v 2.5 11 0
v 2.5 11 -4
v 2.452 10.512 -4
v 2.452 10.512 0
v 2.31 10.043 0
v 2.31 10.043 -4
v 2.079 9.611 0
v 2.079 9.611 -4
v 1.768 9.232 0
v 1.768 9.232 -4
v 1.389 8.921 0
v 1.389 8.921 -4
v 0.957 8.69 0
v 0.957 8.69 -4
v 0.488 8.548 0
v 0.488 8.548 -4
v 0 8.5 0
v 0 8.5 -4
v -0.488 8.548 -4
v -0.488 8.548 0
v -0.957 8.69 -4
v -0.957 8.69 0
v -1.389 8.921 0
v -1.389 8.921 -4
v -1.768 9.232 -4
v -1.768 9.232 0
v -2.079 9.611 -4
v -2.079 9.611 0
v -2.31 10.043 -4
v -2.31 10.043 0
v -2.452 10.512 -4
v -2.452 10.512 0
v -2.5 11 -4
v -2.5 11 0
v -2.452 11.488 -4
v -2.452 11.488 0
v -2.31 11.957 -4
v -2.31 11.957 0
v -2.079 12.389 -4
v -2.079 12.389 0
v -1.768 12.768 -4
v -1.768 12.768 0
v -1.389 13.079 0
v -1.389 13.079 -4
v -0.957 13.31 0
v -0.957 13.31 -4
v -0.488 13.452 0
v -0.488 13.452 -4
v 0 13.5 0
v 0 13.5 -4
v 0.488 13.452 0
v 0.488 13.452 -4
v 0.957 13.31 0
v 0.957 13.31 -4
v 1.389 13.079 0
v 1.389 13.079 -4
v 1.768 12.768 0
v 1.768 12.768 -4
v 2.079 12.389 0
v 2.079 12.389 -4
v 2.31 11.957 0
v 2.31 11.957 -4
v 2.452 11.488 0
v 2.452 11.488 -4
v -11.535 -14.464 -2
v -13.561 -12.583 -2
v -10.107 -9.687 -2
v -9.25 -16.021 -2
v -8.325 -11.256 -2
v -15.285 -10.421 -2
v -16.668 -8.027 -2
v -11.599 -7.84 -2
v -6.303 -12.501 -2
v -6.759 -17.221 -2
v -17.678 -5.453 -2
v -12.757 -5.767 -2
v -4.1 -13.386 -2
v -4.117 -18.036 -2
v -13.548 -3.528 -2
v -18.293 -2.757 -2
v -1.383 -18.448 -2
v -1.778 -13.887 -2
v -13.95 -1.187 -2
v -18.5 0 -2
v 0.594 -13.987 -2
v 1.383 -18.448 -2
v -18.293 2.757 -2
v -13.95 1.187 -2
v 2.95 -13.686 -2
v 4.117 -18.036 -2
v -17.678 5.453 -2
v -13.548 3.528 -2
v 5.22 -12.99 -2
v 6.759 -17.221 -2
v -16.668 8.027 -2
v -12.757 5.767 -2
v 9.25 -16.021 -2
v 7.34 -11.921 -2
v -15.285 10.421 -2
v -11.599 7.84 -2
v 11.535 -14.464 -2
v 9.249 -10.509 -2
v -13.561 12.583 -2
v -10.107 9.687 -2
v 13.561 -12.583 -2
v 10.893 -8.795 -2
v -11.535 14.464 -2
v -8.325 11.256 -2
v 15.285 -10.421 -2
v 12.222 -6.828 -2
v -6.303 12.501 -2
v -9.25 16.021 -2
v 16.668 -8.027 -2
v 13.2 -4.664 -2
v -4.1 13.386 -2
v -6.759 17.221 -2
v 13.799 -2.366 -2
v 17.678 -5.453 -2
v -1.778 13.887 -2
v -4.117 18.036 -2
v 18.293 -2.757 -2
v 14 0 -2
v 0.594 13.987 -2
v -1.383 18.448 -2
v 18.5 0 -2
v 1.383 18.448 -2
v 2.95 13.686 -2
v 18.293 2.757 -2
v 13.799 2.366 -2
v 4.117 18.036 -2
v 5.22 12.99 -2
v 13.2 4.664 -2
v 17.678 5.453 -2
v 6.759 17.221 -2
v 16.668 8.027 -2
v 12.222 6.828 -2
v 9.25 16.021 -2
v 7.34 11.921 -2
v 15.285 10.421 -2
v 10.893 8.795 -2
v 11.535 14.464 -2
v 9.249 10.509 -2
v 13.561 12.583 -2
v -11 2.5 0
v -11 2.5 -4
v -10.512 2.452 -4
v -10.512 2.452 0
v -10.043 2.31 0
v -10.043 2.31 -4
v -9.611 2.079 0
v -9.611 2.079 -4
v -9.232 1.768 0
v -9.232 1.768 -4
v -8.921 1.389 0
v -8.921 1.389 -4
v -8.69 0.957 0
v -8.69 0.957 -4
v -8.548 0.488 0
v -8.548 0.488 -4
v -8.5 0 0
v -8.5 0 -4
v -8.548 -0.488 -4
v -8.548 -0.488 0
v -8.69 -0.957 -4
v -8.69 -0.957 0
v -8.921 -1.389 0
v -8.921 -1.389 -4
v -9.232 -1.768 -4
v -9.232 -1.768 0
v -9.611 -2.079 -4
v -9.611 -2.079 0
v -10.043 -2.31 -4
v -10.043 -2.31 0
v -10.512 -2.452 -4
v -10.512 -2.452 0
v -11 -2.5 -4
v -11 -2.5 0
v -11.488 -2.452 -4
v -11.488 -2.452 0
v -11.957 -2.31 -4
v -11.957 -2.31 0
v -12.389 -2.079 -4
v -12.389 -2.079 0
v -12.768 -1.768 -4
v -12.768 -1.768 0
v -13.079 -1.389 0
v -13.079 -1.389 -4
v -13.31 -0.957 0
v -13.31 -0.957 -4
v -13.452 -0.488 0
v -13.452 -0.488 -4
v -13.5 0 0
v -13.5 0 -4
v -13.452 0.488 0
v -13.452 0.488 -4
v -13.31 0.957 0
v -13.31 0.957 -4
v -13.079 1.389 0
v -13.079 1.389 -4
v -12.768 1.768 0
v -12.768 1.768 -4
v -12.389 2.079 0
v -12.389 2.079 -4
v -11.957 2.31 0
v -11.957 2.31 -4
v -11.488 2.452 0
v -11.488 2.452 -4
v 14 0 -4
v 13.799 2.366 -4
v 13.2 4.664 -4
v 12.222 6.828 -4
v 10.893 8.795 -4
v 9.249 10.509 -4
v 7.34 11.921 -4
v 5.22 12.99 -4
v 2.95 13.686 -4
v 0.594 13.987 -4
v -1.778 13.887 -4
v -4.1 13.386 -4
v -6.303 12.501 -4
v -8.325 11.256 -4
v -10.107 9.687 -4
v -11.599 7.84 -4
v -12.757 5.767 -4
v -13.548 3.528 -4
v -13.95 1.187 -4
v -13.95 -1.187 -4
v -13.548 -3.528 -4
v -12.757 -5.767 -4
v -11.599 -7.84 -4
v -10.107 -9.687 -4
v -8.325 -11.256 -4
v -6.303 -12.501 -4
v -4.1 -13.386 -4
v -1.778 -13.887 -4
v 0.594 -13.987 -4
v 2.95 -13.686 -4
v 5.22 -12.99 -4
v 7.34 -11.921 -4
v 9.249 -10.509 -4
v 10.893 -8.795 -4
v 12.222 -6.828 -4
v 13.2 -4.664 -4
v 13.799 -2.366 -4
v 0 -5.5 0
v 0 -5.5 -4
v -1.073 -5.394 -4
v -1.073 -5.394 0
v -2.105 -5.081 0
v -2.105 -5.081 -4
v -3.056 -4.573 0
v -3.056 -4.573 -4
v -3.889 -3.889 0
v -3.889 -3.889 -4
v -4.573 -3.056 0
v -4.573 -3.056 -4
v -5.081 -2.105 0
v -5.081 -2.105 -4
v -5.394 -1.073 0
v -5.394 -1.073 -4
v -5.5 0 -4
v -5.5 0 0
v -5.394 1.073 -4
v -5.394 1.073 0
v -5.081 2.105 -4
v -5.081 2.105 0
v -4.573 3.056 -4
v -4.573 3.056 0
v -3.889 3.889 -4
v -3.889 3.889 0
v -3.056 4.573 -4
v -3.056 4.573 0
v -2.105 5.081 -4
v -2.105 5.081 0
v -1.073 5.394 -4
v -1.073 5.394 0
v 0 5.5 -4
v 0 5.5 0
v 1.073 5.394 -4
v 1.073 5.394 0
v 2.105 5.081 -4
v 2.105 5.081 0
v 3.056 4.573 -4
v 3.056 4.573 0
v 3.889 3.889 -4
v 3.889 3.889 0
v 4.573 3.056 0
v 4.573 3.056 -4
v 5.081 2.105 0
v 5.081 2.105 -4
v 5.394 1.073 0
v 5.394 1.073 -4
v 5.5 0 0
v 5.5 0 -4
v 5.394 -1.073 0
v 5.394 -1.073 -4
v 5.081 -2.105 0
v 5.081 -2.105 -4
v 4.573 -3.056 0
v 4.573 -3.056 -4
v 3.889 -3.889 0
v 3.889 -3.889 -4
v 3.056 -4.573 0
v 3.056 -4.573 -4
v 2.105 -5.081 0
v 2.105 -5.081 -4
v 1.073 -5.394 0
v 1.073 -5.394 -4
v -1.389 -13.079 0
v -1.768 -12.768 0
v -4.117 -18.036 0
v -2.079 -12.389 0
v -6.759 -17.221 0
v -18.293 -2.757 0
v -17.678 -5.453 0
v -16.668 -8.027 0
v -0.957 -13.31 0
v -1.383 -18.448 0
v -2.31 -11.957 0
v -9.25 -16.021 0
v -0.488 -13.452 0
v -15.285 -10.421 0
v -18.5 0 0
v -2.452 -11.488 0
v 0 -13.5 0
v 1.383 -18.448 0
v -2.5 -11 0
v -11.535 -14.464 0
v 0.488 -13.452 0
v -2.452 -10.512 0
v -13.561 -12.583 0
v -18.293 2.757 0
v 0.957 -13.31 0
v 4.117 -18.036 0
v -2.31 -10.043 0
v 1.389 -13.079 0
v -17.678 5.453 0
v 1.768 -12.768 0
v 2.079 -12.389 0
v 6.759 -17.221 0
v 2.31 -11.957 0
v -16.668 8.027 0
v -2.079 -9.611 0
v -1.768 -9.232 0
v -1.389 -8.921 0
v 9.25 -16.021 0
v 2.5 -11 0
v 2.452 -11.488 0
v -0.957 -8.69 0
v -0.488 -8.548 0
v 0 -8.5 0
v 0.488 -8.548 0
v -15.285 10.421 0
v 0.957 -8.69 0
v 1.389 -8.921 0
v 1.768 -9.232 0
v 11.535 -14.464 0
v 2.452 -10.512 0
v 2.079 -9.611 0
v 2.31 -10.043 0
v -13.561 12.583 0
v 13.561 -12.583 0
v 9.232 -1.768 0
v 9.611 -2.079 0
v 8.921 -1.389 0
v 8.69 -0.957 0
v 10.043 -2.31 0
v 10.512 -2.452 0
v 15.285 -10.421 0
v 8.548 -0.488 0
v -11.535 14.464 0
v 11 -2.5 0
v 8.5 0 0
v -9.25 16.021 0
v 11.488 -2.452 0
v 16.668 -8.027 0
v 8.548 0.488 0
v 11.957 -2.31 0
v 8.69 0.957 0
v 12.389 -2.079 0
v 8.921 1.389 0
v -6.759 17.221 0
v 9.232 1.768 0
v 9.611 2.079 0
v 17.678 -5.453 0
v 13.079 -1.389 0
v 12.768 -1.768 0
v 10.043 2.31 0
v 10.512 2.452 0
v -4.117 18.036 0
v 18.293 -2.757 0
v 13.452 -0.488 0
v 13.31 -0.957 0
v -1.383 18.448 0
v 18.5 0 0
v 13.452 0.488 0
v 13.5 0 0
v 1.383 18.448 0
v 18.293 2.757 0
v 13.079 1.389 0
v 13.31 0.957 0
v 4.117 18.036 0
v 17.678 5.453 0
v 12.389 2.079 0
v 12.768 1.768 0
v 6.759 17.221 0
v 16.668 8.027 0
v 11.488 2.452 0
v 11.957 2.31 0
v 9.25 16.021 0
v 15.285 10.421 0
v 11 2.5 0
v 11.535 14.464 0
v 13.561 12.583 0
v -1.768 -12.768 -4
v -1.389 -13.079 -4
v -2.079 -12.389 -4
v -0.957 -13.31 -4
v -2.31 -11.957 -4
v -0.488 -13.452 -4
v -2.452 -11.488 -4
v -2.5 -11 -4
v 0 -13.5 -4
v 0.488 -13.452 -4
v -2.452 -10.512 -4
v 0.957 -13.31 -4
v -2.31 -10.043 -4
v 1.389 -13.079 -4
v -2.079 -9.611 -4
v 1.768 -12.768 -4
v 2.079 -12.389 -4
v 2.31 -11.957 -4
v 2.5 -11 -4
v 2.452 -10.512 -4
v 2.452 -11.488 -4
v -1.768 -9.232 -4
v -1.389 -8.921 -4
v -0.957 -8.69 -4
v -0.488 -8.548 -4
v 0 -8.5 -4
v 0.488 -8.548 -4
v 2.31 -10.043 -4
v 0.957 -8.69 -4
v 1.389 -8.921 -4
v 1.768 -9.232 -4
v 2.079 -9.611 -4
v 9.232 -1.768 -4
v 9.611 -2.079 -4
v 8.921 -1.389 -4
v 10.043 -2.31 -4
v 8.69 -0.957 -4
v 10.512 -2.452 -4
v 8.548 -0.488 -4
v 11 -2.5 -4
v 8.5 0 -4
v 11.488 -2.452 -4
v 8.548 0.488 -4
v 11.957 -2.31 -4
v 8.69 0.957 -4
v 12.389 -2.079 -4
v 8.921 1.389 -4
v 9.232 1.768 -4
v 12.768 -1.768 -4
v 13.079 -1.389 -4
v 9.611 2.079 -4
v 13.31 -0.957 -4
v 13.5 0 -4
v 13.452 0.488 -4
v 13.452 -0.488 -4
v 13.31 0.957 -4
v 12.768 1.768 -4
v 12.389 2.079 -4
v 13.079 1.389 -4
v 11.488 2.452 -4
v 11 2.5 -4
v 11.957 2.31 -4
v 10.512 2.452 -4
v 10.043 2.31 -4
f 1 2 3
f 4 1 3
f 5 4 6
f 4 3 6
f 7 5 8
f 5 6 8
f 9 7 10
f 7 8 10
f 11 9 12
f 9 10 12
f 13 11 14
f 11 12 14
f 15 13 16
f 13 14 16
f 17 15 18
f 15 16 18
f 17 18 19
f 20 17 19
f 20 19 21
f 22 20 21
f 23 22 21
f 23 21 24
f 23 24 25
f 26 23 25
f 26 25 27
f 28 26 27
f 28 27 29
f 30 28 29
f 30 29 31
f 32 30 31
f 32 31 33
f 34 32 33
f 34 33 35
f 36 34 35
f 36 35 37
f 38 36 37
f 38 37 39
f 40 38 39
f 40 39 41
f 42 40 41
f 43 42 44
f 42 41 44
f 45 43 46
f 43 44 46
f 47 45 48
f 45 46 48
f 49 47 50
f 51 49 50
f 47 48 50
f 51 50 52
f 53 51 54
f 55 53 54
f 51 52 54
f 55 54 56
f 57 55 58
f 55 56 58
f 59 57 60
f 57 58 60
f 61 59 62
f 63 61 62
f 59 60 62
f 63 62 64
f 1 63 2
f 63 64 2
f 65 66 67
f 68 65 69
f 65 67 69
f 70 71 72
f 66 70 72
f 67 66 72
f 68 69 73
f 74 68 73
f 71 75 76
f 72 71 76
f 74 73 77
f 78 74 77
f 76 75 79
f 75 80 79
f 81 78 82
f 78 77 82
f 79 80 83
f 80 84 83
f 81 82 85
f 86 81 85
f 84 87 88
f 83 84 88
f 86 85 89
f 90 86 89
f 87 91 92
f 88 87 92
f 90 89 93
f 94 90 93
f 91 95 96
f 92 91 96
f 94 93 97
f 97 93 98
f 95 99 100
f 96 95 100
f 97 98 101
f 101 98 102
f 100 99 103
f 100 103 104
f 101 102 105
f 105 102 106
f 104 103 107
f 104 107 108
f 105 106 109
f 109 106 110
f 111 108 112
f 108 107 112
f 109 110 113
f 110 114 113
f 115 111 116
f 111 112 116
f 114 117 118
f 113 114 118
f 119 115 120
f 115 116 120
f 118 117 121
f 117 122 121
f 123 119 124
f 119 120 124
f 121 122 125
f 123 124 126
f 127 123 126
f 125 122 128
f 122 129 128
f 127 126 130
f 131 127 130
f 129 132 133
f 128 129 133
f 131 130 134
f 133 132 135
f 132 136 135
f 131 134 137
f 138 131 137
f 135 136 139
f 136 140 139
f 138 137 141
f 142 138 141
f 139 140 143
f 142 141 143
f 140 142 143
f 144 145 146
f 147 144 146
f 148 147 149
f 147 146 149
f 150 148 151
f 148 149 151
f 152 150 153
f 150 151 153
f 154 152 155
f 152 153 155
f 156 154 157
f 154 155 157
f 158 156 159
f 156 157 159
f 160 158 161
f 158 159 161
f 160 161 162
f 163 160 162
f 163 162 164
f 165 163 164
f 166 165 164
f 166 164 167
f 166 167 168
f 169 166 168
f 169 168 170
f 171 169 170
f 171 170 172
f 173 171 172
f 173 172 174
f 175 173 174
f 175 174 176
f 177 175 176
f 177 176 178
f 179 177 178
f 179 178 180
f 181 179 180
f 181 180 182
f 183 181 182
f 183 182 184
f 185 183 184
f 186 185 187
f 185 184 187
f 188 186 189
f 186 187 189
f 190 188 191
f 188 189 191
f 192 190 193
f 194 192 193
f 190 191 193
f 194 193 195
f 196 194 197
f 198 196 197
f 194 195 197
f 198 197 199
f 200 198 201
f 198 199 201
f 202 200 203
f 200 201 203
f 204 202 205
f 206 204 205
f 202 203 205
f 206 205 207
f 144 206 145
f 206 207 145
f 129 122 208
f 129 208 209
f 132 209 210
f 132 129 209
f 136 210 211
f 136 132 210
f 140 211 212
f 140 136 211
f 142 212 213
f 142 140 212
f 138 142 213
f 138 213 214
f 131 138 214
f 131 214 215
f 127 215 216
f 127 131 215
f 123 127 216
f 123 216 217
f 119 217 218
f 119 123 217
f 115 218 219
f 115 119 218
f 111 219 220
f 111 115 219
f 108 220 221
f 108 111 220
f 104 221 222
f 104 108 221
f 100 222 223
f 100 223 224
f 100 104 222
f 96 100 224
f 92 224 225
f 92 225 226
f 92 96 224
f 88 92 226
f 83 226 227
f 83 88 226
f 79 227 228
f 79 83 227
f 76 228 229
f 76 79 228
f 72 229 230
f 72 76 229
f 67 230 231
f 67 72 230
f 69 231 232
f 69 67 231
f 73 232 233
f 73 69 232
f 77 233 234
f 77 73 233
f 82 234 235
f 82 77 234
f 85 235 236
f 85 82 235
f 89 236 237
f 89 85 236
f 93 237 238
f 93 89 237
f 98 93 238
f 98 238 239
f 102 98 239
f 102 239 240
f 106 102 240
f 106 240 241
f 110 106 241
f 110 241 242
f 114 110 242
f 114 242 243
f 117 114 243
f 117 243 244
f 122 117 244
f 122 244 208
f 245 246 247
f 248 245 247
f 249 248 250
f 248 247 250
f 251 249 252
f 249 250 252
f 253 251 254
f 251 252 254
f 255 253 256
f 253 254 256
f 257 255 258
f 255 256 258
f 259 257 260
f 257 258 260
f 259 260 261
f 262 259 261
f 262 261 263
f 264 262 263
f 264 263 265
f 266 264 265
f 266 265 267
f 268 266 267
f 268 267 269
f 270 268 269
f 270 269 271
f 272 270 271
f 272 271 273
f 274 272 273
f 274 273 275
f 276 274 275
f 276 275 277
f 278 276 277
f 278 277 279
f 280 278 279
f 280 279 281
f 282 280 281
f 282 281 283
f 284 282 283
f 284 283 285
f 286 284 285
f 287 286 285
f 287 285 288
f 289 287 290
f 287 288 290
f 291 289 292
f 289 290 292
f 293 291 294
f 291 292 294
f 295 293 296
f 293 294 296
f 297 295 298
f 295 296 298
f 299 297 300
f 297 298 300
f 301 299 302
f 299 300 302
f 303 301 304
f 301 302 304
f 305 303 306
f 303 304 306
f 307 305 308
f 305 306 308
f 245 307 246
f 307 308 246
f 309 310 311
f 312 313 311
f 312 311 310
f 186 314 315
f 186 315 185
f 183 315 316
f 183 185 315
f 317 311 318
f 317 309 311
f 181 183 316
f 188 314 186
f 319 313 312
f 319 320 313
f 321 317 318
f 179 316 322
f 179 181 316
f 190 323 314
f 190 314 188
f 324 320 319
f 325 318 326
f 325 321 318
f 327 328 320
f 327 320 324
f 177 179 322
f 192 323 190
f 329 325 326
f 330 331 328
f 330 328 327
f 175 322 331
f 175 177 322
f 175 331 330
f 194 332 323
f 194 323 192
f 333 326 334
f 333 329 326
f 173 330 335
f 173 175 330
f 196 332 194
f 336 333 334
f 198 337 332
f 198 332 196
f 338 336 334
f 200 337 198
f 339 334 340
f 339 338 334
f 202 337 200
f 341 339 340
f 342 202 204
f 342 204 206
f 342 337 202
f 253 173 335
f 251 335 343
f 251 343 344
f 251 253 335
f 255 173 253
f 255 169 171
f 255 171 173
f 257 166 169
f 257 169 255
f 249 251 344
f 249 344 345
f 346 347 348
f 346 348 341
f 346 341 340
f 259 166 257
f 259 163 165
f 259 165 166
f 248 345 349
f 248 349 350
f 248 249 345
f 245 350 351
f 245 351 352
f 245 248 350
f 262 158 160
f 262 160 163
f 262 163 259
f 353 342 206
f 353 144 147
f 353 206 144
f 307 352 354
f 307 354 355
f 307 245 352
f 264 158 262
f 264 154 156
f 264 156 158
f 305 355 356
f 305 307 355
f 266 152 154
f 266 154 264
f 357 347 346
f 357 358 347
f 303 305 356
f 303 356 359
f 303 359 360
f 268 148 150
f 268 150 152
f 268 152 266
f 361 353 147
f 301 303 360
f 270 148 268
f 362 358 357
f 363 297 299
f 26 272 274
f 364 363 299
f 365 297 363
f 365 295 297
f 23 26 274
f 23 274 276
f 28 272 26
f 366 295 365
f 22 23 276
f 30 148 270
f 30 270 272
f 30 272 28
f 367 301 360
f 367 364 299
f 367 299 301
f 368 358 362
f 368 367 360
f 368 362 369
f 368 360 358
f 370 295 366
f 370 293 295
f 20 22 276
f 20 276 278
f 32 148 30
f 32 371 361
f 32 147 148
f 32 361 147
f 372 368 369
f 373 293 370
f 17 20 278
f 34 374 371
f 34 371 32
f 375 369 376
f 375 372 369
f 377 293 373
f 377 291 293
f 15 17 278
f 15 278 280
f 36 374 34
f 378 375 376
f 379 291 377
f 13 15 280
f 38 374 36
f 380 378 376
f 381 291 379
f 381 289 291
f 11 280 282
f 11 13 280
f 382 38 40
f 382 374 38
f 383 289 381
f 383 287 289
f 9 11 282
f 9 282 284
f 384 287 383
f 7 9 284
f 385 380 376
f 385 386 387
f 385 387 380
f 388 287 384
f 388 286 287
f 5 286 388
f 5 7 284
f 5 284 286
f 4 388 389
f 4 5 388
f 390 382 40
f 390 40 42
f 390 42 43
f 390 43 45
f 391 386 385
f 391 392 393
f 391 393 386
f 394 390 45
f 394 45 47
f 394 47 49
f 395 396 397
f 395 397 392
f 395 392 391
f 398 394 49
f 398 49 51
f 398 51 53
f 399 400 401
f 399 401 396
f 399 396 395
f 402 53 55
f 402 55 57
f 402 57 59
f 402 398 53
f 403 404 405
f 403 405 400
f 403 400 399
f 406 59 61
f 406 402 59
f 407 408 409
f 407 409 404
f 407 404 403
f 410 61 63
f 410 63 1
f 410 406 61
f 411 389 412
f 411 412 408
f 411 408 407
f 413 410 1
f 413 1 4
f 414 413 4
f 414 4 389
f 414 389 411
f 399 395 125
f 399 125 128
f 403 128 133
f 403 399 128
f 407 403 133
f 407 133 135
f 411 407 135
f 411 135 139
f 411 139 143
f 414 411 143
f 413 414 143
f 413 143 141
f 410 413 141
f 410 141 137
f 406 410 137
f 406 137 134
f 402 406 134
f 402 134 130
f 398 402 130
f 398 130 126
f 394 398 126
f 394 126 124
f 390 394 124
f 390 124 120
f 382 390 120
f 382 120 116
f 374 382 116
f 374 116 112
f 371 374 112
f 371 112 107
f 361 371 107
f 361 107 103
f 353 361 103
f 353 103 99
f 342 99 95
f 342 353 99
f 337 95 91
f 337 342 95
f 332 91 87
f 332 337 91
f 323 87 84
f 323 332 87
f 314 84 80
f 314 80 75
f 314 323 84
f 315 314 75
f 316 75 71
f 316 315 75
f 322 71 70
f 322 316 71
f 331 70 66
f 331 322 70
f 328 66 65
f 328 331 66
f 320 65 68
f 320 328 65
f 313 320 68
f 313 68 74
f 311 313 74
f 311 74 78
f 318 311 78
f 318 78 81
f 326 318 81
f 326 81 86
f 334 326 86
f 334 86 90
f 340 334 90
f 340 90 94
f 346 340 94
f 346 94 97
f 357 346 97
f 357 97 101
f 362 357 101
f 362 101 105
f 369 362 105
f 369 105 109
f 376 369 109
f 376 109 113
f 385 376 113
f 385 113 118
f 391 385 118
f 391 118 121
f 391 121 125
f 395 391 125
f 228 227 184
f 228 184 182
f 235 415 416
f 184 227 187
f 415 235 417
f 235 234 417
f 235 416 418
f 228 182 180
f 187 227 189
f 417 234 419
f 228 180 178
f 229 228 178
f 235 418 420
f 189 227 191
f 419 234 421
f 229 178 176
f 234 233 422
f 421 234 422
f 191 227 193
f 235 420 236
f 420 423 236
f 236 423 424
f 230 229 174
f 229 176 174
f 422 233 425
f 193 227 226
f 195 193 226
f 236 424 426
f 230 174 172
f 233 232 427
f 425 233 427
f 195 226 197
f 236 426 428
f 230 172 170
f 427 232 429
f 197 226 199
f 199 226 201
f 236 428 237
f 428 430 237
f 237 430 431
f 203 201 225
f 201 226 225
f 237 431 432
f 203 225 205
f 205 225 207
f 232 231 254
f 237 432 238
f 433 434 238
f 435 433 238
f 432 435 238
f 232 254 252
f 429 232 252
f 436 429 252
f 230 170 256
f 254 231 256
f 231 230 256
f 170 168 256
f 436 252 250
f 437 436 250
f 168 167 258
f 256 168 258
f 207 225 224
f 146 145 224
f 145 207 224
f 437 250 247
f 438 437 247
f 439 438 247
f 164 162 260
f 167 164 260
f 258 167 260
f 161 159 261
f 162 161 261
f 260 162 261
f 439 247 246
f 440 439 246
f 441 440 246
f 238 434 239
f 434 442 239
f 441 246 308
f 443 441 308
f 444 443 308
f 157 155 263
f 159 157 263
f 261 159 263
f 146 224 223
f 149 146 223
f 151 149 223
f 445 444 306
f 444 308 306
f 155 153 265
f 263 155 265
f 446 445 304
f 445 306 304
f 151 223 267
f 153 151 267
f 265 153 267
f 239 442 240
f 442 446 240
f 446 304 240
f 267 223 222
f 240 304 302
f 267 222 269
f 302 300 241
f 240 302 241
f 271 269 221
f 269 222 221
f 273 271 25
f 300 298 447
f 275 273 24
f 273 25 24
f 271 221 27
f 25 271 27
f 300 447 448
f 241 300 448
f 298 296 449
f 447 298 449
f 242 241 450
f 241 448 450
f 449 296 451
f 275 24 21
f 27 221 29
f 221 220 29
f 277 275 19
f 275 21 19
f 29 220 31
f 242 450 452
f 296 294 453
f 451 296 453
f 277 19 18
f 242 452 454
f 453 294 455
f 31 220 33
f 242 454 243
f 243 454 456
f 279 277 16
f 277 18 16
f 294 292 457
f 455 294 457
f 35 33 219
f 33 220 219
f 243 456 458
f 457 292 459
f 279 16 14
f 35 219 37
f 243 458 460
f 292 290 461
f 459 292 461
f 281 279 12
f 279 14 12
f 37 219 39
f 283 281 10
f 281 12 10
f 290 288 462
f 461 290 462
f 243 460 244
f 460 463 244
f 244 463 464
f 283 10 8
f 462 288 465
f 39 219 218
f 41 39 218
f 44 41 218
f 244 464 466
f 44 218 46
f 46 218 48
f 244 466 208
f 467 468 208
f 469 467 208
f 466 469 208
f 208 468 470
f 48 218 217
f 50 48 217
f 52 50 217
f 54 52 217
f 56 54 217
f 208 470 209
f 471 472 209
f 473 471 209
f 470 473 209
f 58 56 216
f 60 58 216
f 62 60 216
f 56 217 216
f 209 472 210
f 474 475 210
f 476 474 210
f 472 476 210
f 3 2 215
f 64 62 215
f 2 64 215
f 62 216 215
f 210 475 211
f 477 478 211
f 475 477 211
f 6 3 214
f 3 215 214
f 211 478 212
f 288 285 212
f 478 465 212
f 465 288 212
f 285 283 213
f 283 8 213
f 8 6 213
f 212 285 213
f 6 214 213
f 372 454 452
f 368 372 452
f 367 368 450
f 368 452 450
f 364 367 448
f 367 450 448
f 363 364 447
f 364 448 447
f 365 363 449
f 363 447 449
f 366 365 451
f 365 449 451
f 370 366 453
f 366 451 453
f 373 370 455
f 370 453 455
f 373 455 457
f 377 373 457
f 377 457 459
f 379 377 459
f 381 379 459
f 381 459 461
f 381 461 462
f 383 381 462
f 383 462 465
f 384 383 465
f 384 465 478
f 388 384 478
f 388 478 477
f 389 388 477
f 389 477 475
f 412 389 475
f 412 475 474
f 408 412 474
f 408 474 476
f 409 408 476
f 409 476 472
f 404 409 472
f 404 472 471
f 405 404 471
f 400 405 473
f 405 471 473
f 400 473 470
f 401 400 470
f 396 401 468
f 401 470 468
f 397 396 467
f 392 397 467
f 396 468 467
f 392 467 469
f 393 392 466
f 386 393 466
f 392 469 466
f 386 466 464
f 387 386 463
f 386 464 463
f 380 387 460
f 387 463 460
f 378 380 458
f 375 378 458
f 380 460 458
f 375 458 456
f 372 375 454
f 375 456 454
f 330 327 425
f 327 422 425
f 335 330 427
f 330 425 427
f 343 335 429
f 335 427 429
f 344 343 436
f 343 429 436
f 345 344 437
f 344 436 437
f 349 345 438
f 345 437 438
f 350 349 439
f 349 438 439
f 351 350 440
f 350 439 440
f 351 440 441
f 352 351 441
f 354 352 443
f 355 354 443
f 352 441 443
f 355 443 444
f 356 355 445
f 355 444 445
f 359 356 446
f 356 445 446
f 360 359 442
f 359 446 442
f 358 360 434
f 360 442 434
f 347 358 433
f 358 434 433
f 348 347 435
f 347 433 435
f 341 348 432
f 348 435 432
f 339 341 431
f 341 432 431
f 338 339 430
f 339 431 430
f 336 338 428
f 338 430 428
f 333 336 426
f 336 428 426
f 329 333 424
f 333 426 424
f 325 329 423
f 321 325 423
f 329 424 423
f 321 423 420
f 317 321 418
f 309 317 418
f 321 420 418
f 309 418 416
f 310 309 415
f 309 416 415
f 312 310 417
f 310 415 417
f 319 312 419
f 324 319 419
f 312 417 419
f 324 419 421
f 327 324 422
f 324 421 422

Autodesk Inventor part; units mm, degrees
ref_plane "YZ Plane" through (0, 0, 0) normal (1, 0, 0) x (0, 1, 0)
ref_plane "XZ Plane" through (0, 0, 0) normal (0, 1, 0) x (-1, 0, 0)
ref_plane "XY Plane" through (0, 0, 0) normal (0, 0, 1) x (1, 0, 0)
sketch "Sketch1" plane through (0, 0, 0) normal (0, 0, 1) x (1, 0, 0)
  circle A0 centre (0, 0) radius 14
  circle A1 centre (0, 0) radius 18.5
  line L0 (0, 0) -> (11, 0) construction
  dimension "d0" = 28
  dimension "d1" = 37
  dimension "d6" = 11
extrude "Extrusion1" add sketch "Sketch1" against normal blind 2 contours A0 | A1
extrude "Extrusion2" add sketch "Sketch1" against normal blind 4 contours A0
hole "Hole1" at (11, 0, 0) direction (0, 0, -1) diameter 5 end through all
pattern_circular "Circular Pattern1" count 4 over 360 about axis through (0, 0, -10) along (0, 0, 1) of "Hole1"
hole "Hole2" at (0, 0, 0) direction (0, 0, -1) diameter 11 end through all
properties part number "arm_coupler2" material "ABS Plastic"
